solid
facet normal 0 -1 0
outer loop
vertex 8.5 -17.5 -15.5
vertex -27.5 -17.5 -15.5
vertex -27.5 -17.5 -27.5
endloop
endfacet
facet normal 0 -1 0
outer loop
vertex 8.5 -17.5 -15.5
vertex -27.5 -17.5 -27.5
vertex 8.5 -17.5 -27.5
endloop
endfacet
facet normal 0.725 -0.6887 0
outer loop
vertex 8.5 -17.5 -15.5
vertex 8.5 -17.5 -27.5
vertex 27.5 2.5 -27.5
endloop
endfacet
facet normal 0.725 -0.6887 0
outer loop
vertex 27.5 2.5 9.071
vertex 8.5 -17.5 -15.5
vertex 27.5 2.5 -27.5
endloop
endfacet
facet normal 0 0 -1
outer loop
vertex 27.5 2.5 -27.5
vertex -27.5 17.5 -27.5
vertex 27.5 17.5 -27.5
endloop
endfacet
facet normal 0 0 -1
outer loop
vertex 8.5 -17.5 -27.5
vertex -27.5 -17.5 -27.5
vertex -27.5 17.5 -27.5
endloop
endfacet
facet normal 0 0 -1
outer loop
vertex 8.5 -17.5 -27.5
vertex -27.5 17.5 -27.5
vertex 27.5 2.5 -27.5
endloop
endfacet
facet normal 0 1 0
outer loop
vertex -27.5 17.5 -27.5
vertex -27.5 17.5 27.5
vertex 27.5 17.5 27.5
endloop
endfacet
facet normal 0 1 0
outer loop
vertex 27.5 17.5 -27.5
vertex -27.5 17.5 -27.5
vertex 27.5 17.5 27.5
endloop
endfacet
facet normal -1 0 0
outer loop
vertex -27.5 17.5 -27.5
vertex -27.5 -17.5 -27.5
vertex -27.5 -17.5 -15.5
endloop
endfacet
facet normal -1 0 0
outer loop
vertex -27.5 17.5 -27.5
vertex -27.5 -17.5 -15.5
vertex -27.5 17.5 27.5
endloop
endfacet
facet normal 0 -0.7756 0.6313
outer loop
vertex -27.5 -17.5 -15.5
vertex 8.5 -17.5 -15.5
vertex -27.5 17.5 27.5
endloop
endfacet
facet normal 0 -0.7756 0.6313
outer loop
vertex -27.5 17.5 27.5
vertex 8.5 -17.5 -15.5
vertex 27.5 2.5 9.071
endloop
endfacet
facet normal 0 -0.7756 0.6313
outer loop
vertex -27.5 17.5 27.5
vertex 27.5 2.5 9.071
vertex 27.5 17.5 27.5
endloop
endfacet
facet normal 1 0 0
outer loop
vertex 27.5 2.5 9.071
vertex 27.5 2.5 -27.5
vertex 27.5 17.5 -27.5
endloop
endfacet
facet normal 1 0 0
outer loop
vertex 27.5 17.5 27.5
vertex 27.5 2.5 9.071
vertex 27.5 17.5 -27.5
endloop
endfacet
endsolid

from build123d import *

# Parameters (mm, degrees)
F0_W     = 55
F0_H     = 55
F1_DEPTH = 17.5
F3_DEPTH = 55.001
F5_DEPTH = 55.001


with BuildPart() as f1:
    # F0 (on Front) → F1 (new body, symmetric)
    with BuildSketch(Plane.XZ):
        Rectangle(F0_W, F0_H)
    extrude(amount=F1_DEPTH, both=True)

    # F2 (on face) → F3 (cut, through all)
    with BuildSketch(Plane.YZ.offset(27.5)):
        Polygon((-17.5, 27.5), (-17.5, -15.5), (17.5, 27.5), align=None)
    extrude(amount=-F3_DEPTH, mode=Mode.SUBTRACT)

    # F4 (on face) → F5 (cut, through all)
    with BuildSketch(Plane(origin=(0, 0, -27.5), x_dir=(1, 0, 0), z_dir=(0, 0, -1))):
        Polygon((8.5, 17.5), (27.5, -2.5), (27.5, 17.5), align=None)
    extrude(amount=-F5_DEPTH, mode=Mode.SUBTRACT)


solid = f1.part
